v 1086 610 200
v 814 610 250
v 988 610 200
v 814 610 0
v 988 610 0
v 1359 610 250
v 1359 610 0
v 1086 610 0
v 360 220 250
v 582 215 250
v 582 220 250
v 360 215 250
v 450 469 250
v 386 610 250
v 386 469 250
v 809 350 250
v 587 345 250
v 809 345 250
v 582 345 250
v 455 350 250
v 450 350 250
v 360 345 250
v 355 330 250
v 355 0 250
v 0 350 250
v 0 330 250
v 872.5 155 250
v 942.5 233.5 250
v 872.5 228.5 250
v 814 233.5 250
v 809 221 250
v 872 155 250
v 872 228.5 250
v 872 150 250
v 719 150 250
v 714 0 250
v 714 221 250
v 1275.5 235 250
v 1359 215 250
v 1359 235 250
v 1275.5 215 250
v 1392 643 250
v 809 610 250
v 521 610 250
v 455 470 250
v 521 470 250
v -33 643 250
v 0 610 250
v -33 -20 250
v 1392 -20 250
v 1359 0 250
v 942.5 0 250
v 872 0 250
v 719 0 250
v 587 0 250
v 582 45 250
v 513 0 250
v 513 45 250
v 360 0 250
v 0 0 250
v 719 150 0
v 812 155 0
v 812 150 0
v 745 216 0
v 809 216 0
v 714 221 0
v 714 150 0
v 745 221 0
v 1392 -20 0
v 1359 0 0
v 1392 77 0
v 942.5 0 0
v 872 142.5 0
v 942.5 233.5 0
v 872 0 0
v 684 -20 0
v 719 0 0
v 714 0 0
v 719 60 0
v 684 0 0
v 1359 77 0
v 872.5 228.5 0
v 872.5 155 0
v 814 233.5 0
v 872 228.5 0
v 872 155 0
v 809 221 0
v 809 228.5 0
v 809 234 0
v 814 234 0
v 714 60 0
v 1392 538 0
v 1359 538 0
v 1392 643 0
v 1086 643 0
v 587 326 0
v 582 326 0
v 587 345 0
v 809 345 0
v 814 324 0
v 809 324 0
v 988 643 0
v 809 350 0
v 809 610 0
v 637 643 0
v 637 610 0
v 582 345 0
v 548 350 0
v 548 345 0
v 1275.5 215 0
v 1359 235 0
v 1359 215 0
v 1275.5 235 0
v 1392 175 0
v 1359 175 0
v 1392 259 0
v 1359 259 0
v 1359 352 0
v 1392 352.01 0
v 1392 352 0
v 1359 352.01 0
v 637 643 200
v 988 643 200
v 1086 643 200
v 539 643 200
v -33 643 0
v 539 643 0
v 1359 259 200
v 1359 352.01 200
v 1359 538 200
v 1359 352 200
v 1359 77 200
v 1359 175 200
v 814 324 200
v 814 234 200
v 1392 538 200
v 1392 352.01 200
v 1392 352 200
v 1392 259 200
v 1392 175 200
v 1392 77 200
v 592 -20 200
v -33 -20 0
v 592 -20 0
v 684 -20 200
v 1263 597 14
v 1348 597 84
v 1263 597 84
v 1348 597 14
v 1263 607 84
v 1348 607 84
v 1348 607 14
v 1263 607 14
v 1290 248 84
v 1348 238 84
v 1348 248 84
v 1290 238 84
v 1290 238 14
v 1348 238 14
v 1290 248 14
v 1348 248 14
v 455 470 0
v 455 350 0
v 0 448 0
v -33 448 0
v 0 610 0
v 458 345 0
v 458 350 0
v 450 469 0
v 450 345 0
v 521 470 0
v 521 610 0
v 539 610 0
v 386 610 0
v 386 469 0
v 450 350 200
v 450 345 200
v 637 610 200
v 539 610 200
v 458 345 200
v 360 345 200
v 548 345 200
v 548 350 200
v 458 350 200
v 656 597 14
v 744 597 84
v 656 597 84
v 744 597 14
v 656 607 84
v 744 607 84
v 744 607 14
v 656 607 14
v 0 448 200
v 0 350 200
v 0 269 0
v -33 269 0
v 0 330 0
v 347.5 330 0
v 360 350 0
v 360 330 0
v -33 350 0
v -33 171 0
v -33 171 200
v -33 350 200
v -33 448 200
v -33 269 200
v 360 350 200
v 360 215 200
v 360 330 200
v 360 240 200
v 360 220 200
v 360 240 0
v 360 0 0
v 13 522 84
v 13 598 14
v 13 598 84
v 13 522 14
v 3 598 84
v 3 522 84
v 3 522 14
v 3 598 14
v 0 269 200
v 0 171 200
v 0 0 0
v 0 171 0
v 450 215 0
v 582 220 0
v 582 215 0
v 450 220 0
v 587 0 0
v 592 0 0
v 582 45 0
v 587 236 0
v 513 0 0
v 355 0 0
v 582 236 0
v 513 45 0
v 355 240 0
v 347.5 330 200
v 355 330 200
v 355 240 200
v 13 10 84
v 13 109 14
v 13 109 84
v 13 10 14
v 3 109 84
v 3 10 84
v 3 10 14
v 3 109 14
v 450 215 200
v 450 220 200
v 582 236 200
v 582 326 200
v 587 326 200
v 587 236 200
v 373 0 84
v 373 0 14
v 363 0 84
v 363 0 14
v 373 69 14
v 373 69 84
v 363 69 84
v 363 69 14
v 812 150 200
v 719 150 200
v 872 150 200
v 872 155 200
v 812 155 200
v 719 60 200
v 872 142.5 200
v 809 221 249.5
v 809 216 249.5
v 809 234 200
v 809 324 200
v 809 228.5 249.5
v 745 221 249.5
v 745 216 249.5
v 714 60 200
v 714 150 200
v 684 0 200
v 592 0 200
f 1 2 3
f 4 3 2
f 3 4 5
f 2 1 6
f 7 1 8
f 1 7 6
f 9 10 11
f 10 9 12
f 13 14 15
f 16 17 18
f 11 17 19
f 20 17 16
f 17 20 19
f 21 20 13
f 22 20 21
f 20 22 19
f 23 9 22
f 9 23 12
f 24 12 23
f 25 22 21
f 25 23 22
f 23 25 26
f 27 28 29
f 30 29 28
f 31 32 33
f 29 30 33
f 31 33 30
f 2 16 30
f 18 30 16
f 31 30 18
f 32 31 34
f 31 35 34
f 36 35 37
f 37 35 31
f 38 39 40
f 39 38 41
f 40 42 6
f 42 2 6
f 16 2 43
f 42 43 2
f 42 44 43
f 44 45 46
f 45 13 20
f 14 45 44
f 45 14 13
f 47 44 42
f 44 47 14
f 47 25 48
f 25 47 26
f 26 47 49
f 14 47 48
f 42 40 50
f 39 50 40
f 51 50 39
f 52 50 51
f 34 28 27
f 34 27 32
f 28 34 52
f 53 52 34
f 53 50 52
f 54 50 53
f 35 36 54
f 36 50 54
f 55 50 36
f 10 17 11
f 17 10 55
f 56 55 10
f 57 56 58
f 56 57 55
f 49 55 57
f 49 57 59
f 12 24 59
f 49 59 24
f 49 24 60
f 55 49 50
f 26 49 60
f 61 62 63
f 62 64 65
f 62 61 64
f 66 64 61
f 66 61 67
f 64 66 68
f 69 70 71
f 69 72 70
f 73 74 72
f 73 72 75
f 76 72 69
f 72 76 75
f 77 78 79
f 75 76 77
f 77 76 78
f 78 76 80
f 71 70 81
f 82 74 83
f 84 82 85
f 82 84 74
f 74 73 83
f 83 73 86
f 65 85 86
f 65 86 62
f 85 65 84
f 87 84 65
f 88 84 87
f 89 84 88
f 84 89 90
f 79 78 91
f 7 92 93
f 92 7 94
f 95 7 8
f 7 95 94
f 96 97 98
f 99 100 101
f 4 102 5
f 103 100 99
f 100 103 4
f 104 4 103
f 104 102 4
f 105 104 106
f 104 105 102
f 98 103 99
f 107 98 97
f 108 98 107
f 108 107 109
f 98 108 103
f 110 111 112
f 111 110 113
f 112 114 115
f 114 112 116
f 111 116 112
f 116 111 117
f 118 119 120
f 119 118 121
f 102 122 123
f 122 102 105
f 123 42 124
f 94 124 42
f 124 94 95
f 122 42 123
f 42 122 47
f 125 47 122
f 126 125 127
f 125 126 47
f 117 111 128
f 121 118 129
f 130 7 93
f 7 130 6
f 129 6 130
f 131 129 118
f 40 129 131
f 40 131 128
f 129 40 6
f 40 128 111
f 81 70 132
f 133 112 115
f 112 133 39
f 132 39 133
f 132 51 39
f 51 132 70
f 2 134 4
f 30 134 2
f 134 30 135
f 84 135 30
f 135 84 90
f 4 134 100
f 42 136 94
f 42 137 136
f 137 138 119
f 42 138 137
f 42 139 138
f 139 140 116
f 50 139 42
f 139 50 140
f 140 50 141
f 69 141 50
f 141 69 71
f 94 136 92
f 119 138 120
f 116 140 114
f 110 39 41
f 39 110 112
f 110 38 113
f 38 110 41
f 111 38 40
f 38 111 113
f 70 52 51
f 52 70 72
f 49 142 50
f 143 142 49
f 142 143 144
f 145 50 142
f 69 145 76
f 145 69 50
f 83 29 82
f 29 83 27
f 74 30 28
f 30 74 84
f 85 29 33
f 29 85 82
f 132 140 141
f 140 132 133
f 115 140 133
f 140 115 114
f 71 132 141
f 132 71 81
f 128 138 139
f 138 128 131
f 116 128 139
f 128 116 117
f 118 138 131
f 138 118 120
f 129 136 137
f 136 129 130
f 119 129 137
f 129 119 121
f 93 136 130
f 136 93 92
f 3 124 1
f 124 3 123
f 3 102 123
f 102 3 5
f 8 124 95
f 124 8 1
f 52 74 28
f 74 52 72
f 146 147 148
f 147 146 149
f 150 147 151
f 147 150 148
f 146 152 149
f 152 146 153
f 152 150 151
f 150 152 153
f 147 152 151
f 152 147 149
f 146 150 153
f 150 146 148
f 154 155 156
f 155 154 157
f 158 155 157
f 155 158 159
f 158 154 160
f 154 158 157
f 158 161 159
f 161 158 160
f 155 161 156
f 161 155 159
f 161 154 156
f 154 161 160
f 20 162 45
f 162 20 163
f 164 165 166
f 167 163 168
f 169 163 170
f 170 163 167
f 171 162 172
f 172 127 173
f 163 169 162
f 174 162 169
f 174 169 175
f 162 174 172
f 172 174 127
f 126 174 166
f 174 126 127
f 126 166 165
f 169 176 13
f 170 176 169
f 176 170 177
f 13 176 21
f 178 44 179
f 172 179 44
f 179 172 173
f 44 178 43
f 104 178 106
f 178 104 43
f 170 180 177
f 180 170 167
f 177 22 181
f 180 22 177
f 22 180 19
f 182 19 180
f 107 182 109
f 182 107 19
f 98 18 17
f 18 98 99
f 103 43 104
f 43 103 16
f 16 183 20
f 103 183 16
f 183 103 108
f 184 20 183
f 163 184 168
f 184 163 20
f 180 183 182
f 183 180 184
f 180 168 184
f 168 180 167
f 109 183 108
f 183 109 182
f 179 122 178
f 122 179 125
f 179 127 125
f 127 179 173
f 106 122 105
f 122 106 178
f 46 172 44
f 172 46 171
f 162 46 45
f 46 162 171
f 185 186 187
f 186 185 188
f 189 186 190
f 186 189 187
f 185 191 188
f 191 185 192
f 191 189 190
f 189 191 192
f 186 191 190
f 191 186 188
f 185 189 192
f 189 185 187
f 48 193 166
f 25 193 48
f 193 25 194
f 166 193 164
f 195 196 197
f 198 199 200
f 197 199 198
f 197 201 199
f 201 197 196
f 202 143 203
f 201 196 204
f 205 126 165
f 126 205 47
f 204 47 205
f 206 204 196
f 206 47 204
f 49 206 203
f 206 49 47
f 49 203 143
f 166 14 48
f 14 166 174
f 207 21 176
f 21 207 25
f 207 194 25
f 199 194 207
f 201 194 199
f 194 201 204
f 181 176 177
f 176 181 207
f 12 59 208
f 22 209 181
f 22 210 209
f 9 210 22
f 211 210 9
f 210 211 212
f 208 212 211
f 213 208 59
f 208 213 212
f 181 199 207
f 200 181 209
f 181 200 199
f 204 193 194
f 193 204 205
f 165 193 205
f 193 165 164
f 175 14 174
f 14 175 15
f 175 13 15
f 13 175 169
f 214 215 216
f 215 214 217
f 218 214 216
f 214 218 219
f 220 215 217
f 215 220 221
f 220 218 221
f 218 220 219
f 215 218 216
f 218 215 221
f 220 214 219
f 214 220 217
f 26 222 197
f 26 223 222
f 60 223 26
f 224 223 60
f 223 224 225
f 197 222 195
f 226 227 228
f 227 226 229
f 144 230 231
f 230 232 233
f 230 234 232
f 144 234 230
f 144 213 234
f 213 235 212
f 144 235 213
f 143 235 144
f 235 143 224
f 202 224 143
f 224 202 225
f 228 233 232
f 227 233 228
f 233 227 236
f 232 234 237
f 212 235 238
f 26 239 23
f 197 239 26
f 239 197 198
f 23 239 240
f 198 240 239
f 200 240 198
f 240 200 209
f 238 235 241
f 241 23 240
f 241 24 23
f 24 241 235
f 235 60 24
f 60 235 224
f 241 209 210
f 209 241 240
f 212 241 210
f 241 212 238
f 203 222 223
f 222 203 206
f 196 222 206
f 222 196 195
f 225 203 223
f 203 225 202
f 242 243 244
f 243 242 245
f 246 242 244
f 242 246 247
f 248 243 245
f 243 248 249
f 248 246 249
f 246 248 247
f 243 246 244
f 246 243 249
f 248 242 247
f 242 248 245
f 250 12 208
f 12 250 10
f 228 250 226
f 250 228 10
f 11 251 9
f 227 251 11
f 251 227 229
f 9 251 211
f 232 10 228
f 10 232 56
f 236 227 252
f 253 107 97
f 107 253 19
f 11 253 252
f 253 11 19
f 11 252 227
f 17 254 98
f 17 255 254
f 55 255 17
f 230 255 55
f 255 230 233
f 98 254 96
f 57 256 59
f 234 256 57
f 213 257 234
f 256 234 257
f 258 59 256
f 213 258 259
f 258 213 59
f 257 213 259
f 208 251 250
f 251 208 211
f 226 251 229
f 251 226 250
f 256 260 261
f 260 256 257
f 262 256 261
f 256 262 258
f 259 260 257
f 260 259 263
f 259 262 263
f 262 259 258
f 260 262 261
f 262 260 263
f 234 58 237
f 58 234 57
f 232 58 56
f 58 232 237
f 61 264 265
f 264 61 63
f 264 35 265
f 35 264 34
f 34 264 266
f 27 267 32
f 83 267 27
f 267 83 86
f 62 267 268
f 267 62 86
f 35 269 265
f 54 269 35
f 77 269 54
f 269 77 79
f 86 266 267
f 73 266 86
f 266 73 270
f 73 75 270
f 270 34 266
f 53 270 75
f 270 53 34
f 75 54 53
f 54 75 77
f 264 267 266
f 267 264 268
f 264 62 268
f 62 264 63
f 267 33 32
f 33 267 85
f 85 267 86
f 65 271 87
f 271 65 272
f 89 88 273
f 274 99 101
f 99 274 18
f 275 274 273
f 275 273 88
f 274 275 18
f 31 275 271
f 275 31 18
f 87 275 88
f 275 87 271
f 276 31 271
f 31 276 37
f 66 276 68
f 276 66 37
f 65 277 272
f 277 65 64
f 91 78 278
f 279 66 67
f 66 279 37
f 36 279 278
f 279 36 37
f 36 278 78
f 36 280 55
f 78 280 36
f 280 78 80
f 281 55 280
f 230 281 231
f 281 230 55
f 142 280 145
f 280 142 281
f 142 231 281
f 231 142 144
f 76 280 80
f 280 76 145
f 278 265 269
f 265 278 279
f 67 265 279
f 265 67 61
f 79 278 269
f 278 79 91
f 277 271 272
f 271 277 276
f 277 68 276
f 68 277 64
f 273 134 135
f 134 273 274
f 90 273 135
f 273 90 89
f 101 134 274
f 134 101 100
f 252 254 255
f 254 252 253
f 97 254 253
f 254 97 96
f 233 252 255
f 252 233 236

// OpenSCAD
// file: ../wood.scad
include <tools.scad>

//Draw a board and displays its dimensions
module board(length, width, thickness, quiet=true, name=""){
	cube([length, width, thickness]);
	
	if(!quiet){
		board=(name!="")?str("Board - ",name,":"):"Board:";
		echo(str(board,length,"x",width,"x",thickness," ",unit));
	}
}

board(10, 10, 1, false);

translate([15, 0, 0]) board(10, 10, 1, false, "left side");
// file: ../cabinet.scad
use <sample_wood.scad>
use <tools.scad>

//Defines a cabinet
// cabinet_height \
// cabinet_width   > Define the cabinet dimensions (outer)
// cabinet_depth  /
// foot_height - Defines the height of the foot: along the length of the cabinet, under the bottom shelf a bar help stabilise and strengthen the cabinet
// side_thickness \_ Define the wood thickness for the sides and back
// back_thickness /
module cabinet(cabinet_height, cabinet_width, cabinet_depth, foot_height, side_thickness, back_thickness) {
	shelves_length=cabinet_width-2*side_thickness;
	
	//Left
	translate([0, 0, 0]) rotate([0, -90, 0]) board_lightWood(cabinet_height, cabinet_depth, side_thickness, "left side");
	
	//Right
	translate([cabinet_width-side_thickness, 0, 0]) rotate([0, -90, 0]) board_lightWood(cabinet_height, cabinet_depth, side_thickness, "right side");
	
	//Bottom
	translate([0, 0, foot_height]) board_lightWood(shelves_length, cabinet_depth, side_thickness, "bottom");
	
	//Top
	translate([0, 0, cabinet_height-side_thickness]) board_lightWood(shelves_length, cabinet_depth, side_thickness, "top");
	
	//Back
	bevel=side_thickness-0.5;
	translate([-bevel, cabinet_depth, foot_height+side_thickness-bevel]) rotate([90, 0, 0]) board_darkWood(shelves_length+2*bevel, cabinet_height-foot_height-2*side_thickness+2*bevel, back_thickness, "back");
	
	//Foot reinforcement
	if(foot_height!=0){
		translate([0, side_thickness, 0]) rotate([90, 0, 0]) board_lightWood(shelves_length, foot_height, side_thickness, "font front");
		translate([0, cabinet_depth, 0]) rotate([90, 0, 0]) board_lightWood(shelves_length, foot_height, side_thickness, "foot back");
	}
}

cabinet(cabinet_height=230, cabinet_width=150, cabinet_depth=37, foot_height=5, side_thickness=2, back_thickness=1.5);
// file: ../sample_book.scad
//Global variable used to display books, helping visualise the furniture usage
ADD_BOOKS=true;
//Benefit from the openscad customiser: all the files including the sammple_book should overwrite this value to allow control from the customiser

module book(width, height, thickness){
	couleur=rands(0, 0.6, 3);
	
	translate([0, -width, 0]) color(couleur, 1) cube([thickness, width, height]);
}

//Recursive funtion that places books
module add_books(offset, largeur_etagere, min_largeur, max_largeur, min_hauteur, max_hauteur,  min_epaisseur, max_epaisseur){
	if(offset+min_epaisseur<largeur_etagere){
		//Ajoute un livre
		width=rands(min_largeur, max_largeur, 1)[0];
		height=rands(min_hauteur, max_hauteur, 1)[0];
		thickness=min(rands(min_epaisseur, max_epaisseur, 1)[0], largeur_etagere-offset);
		translate([offset, 0, 0]) book(width, height, thickness);
		
		//Appelle pour en ajouter un autre
		add_books(offset+thickness, largeur_etagere, min_largeur, max_largeur, min_hauteur, max_hauteur,  min_epaisseur, max_epaisseur);
	}
}

//Wrapper function calling the recursive one above
module books(largeur_etagere, min_largeur, max_largeur, min_hauteur, max_hauteur,  min_epaisseur, max_epaisseur){
// 	//Global variable used to display books, helping visualise the furniture usage
// 	ADD_BOOKS=true;
	
	if(ADD_BOOKS==true){
		add_books(0, largeur_etagere, min_largeur, max_largeur, min_hauteur, max_hauteur,  min_epaisseur, max_epaisseur);
	}
}
// file: ../sample_wood.scad
include <tools.scad>
use <wood.scad>

module board_darkWood(length, width, thickness, name=""){
	color("SaddleBrown") board(length, width, thickness);
	
	board=(name!="")?str("Board - ",name):"Board";
	echo(str(board,", dark wood: ",length,"x",width,"x",thickness," ",unit));
}

board_darkWood(10, 10, 1);

module board_greyWood(length, width, thickness, name=""){
	color("OldLace") board(length, width, thickness);
	
	board=(name!="")?str("Board - ",name):"Board";
	echo(str(board,", grey wood: ",length,"x",width,"x",thickness," ",unit));
}

translate([15, 0, 0]) board_greyWood(10, 10, 1);

module board_lightWood(length, width, thickness, name=""){
	color("BlanchedAlmond") board(length, width, thickness);
	
	board=(name!="")?str("Board - ",name):"Board";
	echo(str(board,", light wood: ",length,"x",width,"x",thickness," ",unit));
}

translate([30, 0, 0]) board_lightWood(10, 10, 1, "sample 3");
// file: ../tools.scad
unit="cm";

//Draw reference axis
module drawAxis(s=1){
	rotate([0, 90, 0]) color("Crimson") cylinder(h=s, r1=s/20, r2=s/20, $fn=10);
	rotate([-90, 0, 0]) color("LimeGreen") cylinder(h=s, r1=s/20, r2=s/20, $fn=10);
	color("DodgerBlue") cylinder(h=s, r1=s/20, r2=s/20, $fn=10);
}

// drawAxis(1);
// 
// translate([2, 0, 0]) rotate([0, -45, 0]) drawAxis(1);
// 
// rotate([0, -45, 0]) translate([2, 0, 0]) drawAxis(1);
// main file
include <../tools.scad>
use <../sample_wood.scad>
include <../sample_book.scad>
use <../cabinet.scad>
use <../bookshelf_straight.scad>
use <../bookshelf_diagonal.scad>
use <../room.scad>

//In order to draw books and visualise them, inside sample_books.scad, change the variable value
// Dispaly book to help at visualisation
// ADD_BOOKS=true;

//Global variable used to demonstrate the swept_volume
draw_swept_volume=false;


//======================================================================
// Living Room
//======================================================================

walls_living_room=[[376.5, 0, 0], [174+98+273, -90, 33], [375, -90, 33], [83.5, -90, 20], [83.5, -180, 0], [20, -90, 20], [215, 0, 33], [415+66.5, -90, 20], [233.5, -90, 5], [130-66.5, 90, 5]];
walls_angle_living_room = Build_walls_angle(walls_living_room);
walls_origin_living_room = Build_walls_origin(walls_living_room, walls_angle_living_room);
walls_end_living_room = Build_walls_end(walls_living_room, walls_angle_living_room, walls_origin_living_room);

translate([450+5+354+5, 233.5, 0]){
	//Room walls and opening
// 	create_panel_opening(walls_living_room, walls_angle_living_room, walls_origin_living_room, wall_id=0, offset=[0, 0], shape=[89, 200], draw_swept_volume=draw_swept_volume) - declared in entrance
	create_panel_opening(walls_living_room, walls_angle_living_room, walls_origin_living_room, wall_id=1, offset=[174, 0], shape=[98, 200], draw_swept_volume=draw_swept_volume)
	create_double_panel_opening(walls_living_room, walls_angle_living_room, walls_origin_living_room, wall_id=2, offset=[72, 0], shape=[186, 200], draw_swept_volume=draw_swept_volume, left_panel_width=0.5)
	create_fixed_opening(walls_living_room, walls_angle_living_room, walls_origin_living_room, wall_id=2, offset=[258, 0], shape=[93, 200])
	create_panel_opening(walls_living_room, walls_angle_living_room, walls_origin_living_room, wall_id=6, offset=[40, 0], shape=[98, 200], swept_side_left=false, draw_swept_volume=draw_swept_volume)
	color("Gray") walls(walls_living_room, walls_angle_living_room, walls_origin_living_room, default_walls_height=250);

	//Heaters
	translate_on_wall_end(walls_angle_living_room, walls_end_living_room, wall_id=1){
		translate([3, -85-11, 14]) color("White") cube([10, 85, 70]);
	}

	translate_on_wall(walls_angle_living_room, walls_origin_living_room, wall_id=3){
		translate([3, 11, 14]) color("White") cube([10, 58, 70]);
	}

	//Closet
	translate_on_wall(walls_angle_living_room, walls_origin_living_room, wall_id=8){
		translate([0, 233.5-5, 0]) color("Gray") cube([65, 5, 250]);
		translate([0, 68, 0]) color("Gray", alpha=0.5) cube([65, 233.5-68-5, 250]);
	}

	// Tech duct
	translate_on_wall(walls_angle_living_room, walls_origin_living_room, wall_id=8){
		color("Gray") cube([65, 68, 250]);
	}


	bookshelf_depth=33.5;

// 	//First bookshelf
// 	translate_on_wall(walls_angle_living_room, walls_origin_living_room, wall_id=0){
// 		translate([bookshelf_depth, 109, 0])
// 		rotate([0, 0, 90])
// 		bookshelf_diagonal(shelves_height=[40, 36, 32, 32, 32, 32], bookshelf_width=170, bookshelf_depth=bookshelf_depth, foot_height=3.6, side_thickness=2.2, back_thickness=1.5, shelf_thickness=2.2, diagonal_width=30, diagonal_angle=24.4, diagonal_position=0);
// 	}
// 
// 	//Second bookshelf
// 	translate_on_wall(walls_angle_living_room, walls_origin_living_room, wall_id=1){
// 		translate([bookshelf_depth, 24, 0])
// 		rotate([0, 0, 90])
// 		bookshelf_straight(shelves_height=[40, 36, 32, 32, 32, 32], bookshelf_width=150, bookshelf_depth=bookshelf_depth, foot_height=3.6, side_thickness=2.2, back_thickness=1.5, shelf_thickness=2.2, niche=[2,4], niche_width=50, niche_angle=0, niche_position=0.75, add_doors=true, door_covering=3, door_recess=3);
// 	}
}




//======================================================================
// Room 3
//======================================================================

walls_room_3 =[[260, 0, 5], [354, -90, 33], [260, -90, 5], [354, -90, 5]];
walls_angle_room_3 = Build_walls_angle(walls_room_3);
walls_origin_room_3 = Build_walls_origin(walls_room_3, walls_angle_room_3);
walls_end_room_3 = Build_walls_end(walls_room_3, walls_angle_room_3, walls_origin_room_3);

translate([450+5, 330+20, 0]){
	//Room walls and opening
	create_panel_opening(walls_room_3, walls_angle_room_3, walls_origin_room_3, wall_id=1, offset=[354-172-98, 0], shape=[98, 200], draw_swept_volume=draw_swept_volume)
	create_panel_opening(walls_room_3, walls_angle_room_3, walls_origin_room_3, wall_id=3, offset=[354-90-3, 0], shape=[90, 200], swept_side_left=false, draw_swept_volume=draw_swept_volume)
	color("Gray") walls(walls_room_3, walls_angle_room_3, walls_origin_room_3, default_walls_height=250);

	//Heaters
	translate_on_wall_end(walls_angle_room_3, walls_end_room_3, wall_id=1){
		translate([3, -172+19, 14]) color("White") cube([10, 88, 70]);
	}

	//Closet
	translate_on_wall(walls_angle_room_3, walls_origin_room_3, wall_id=0){
		translate([0, 120, 0]){
			color("Gray") cube([66, 5, 250]);
			translate([0, 5, 0]) color("Gray", alpha=0.5) cube([66, 140, 250]);
		}
	}
}





//======================================================================
// Room 2
//======================================================================

walls_room_2 =[[260, 0, 33], [450, -90, 33], [260, -90, 5], [450, -90, 5]];
walls_angle_room_2 = Build_walls_angle(walls_room_2);
walls_origin_room_2 = Build_walls_origin(walls_room_2, walls_angle_room_2);
walls_end_room_2 = Build_walls_end(walls_room_2, walls_angle_room_2, walls_origin_room_2);

translate([0, 330+20, 0]){
	//Room walls and opening
	create_panel_opening(walls_room_2, walls_angle_room_2, walls_origin_room_2, wall_id=0, offset=[0, 0], shape=[98, 200], draw_swept_volume=draw_swept_volume)
	create_panel_opening(walls_room_2, walls_angle_room_2, walls_origin_room_2, wall_id=3, offset=[0, 0], shape=[90, 200], draw_swept_volume=draw_swept_volume)
	color("Gray") walls(walls_room_2, walls_angle_room_2, walls_origin_room_2, default_walls_height=250);

	//Heaters
	translate_on_wall(walls_angle_room_2, walls_origin_room_2, wall_id=0){
		translate([3, 98+74, 14]) color("White") cube([10, 76, 70]);
	}

	//Closet
	translate_on_wall(walls_angle_room_2, walls_origin_room_2, wall_id=2){
		translate([0, 141-5, 0]) color("Gray") cube([64, 5, 250]);
		color("Gray", alpha=0.5) cube([64, 141-5, 250]);
	}
}


//======================================================================
// Room 1
//======================================================================

walls_room_1 =[[330, 0, 33], [355, -90, 20], [330, -90, 5], [355, -90, 20]];
walls_angle_room_1 = Build_walls_angle(walls_room_1);
walls_origin_room_1 = Build_walls_origin(walls_room_1, walls_angle_room_1);
walls_end_room_1 = Build_walls_end(walls_room_1, walls_angle_room_1, walls_origin_room_1);

translate([0, 0, 0]){
	//Room walls and opening
	create_panel_opening(walls_room_1, walls_angle_room_1, walls_origin_room_1, wall_id=0, offset=[330-61-98, 0], shape=[98, 200], draw_swept_volume=draw_swept_volume)
	create_panel_opening(walls_room_1, walls_angle_room_1, walls_origin_room_1, wall_id=2, offset=[0, 0], shape=[90, 200], draw_swept_volume=draw_swept_volume)
	color("Gray") walls(walls_room_1, walls_angle_room_1, walls_origin_room_1, default_walls_height=250);
	
	//Heaters
	translate_on_wall(walls_angle_room_1, walls_origin_room_1, wall_id=0){
		translate([3, 10, 14]) color("White") cube([10, 99, 70]);
	}
	
	//Closet
	//...
}



//======================================================================
// Bathroom
//======================================================================

walls_bathroom =[[215, 0, 5], [222, -90, 5], [215, -90, 5], [222, -90, 20]];
walls_angle_bathroom = Build_walls_angle(walls_bathroom);
walls_origin_bathroom = Build_walls_origin(walls_bathroom, walls_angle_bathroom);
walls_end_bathroom = Build_walls_end(walls_bathroom, walls_angle_bathroom, walls_origin_bathroom);

translate([355+5, 0, 0]){
	//Room walls and opening
	create_panel_opening(walls_bathroom, walls_angle_bathroom, walls_origin_bathroom, wall_id=1, offset=[0, 0], shape=[90, 200], swept_direction_inside=false, draw_swept_volume=draw_swept_volume)
	color("Gray") walls(walls_bathroom, walls_angle_bathroom, walls_origin_bathroom, default_walls_height=250);
	
	//Heaters
	translate_on_wall(walls_angle_bathroom, walls_origin_bathroom, wall_id=0){
		translate([3, 0, 14]) color("White") cube([10, 69, 70]);
	}
	
	//Tech duct
	translate_on_wall(walls_angle_bathroom, walls_origin_bathroom, wall_id=3){
		color("Gray") cube([215-170, 69, 250]);
	}
	
	//Bathtub
	//...
}



//======================================================================
// WC
//======================================================================

walls_wc =[[150, 0, 0], [153, -90, 5], [150, -90, 5], [153, -90, 20]];
walls_angle_wc = Build_walls_angle(walls_wc);
walls_origin_wc = Build_walls_origin(walls_wc, walls_angle_wc);
walls_end_wc = Build_walls_end(walls_wc, walls_angle_wc, walls_origin_wc);

translate([355+5+222+5+127+5, 0, 0]){
	//Room walls and opening
// 	create_panel_opening(walls_wc, walls_angle_wc, walls_origin_wc, wall_id=0, offset=[60, 0], shape=[90, 200], swept_direction_inside=false, draw_swept_volume=draw_swept_volume) - decalred in entrance
	create_panel_opening(walls_wc, walls_angle_wc, walls_origin_wc, wall_id=1, offset=[93, 0], shape=[60, 200], draw_swept_volume=draw_swept_volume)
	color("Gray") walls(walls_wc, walls_angle_wc, walls_origin_wc, default_walls_height=250);
	
	//Closet (door placed as opening above)
	translate_on_wall(walls_angle_wc, walls_origin_wc, wall_id=1){
		translate([-(233.5-5-150), 93, 0]) color("Gray", alpha=0.5) cube([233.5-5-5-150, 60, 250]);
	}
	
	//Toilet
	//...
}




//======================================================================
// Entrance
//======================================================================

walls_entrance =[[345, 0, 5], [222, -90, 5], [124, -90, 5], [222-127, -90, 5], [345-124, 90, 5], [127, -90, 20]];
walls_angle_entrance = Build_walls_angle(walls_entrance);
walls_origin_entrance = Build_walls_origin(walls_entrance, walls_angle_entrance);
walls_end_entrance = Build_walls_end(walls_entrance, walls_angle_entrance, walls_origin_entrance);

translate([355+5+222+5, 0, 0]){
	//Room walls and opening
	create_panel_opening(walls_entrance, walls_angle_entrance, walls_origin_entrance, wall_id=0, offset=[236, 0], shape=[90, 200], swept_direction_inside=false, draw_swept_volume=draw_swept_volume)
	create_panel_opening(walls_entrance, walls_angle_entrance, walls_origin_entrance, wall_id=2, offset=[21, 0], shape=[90, 200], swept_side_left=false, swept_direction_inside=false, draw_swept_volume=draw_swept_volume)
	create_panel_opening(walls_entrance, walls_angle_entrance, walls_origin_entrance, wall_id=3, offset=[0, 0], shape=[64, 249.5], swept_side_left=false, draw_swept_volume=draw_swept_volume)
	create_panel_opening(walls_entrance, walls_angle_entrance, walls_origin_entrance, wall_id=4, offset=[221-60-90, 0], shape=[90, 200], swept_side_left=false, draw_swept_volume=draw_swept_volume)
	create_panel_opening(walls_entrance, walls_angle_entrance, walls_origin_entrance, wall_id=5, offset=[127-92-5, 0], shape=[92, 200], swept_side_left=false, draw_swept_volume=draw_swept_volume)
	color("Gray") walls(walls_entrance, walls_angle_entrance, walls_origin_entrance, default_walls_height=250);
	
	//Closet (door placed as opening above)
	translate_on_wall(walls_angle_entrance, walls_origin_entrance, wall_id=3){
		translate([-61-5, 0, 0]) color("Gray", alpha=0.5) cube([61, 64, 250]);
		translate([-66, -5, 0]) color("Gray") cube([66, 5, 250]); //Fake wall to complete walls
		
	}
	
	//Tech duct
	translate_on_wall(walls_angle_entrance, walls_origin_entrance, wall_id=3){
		translate([-66, 64, 0]) color("Gray") cube([66, 222-127-64, 250]);
	}
	
	//Toilet
	//...
}





//======================================================================
// Corridor
//======================================================================

walls_corridor =[[376.5, 0, 5], [174+98+273, -90, 20], [375, -90, 20], [83.5, -90, 20], [83.5, -180, 0], [20, -90, 20], [215, 0, 20], [415, -90, 20], [233.5, -90, 5], [130, 90, 5]];
walls_angle_corridor = Build_walls_angle(walls_corridor);
walls_origin_corridor = Build_walls_origin(walls_corridor, walls_angle_corridor);
walls_end_corridor = Build_walls_end(walls_corridor, walls_angle_corridor, walls_origin_corridor);







//======================================================================
// Balcony
//======================================================================
